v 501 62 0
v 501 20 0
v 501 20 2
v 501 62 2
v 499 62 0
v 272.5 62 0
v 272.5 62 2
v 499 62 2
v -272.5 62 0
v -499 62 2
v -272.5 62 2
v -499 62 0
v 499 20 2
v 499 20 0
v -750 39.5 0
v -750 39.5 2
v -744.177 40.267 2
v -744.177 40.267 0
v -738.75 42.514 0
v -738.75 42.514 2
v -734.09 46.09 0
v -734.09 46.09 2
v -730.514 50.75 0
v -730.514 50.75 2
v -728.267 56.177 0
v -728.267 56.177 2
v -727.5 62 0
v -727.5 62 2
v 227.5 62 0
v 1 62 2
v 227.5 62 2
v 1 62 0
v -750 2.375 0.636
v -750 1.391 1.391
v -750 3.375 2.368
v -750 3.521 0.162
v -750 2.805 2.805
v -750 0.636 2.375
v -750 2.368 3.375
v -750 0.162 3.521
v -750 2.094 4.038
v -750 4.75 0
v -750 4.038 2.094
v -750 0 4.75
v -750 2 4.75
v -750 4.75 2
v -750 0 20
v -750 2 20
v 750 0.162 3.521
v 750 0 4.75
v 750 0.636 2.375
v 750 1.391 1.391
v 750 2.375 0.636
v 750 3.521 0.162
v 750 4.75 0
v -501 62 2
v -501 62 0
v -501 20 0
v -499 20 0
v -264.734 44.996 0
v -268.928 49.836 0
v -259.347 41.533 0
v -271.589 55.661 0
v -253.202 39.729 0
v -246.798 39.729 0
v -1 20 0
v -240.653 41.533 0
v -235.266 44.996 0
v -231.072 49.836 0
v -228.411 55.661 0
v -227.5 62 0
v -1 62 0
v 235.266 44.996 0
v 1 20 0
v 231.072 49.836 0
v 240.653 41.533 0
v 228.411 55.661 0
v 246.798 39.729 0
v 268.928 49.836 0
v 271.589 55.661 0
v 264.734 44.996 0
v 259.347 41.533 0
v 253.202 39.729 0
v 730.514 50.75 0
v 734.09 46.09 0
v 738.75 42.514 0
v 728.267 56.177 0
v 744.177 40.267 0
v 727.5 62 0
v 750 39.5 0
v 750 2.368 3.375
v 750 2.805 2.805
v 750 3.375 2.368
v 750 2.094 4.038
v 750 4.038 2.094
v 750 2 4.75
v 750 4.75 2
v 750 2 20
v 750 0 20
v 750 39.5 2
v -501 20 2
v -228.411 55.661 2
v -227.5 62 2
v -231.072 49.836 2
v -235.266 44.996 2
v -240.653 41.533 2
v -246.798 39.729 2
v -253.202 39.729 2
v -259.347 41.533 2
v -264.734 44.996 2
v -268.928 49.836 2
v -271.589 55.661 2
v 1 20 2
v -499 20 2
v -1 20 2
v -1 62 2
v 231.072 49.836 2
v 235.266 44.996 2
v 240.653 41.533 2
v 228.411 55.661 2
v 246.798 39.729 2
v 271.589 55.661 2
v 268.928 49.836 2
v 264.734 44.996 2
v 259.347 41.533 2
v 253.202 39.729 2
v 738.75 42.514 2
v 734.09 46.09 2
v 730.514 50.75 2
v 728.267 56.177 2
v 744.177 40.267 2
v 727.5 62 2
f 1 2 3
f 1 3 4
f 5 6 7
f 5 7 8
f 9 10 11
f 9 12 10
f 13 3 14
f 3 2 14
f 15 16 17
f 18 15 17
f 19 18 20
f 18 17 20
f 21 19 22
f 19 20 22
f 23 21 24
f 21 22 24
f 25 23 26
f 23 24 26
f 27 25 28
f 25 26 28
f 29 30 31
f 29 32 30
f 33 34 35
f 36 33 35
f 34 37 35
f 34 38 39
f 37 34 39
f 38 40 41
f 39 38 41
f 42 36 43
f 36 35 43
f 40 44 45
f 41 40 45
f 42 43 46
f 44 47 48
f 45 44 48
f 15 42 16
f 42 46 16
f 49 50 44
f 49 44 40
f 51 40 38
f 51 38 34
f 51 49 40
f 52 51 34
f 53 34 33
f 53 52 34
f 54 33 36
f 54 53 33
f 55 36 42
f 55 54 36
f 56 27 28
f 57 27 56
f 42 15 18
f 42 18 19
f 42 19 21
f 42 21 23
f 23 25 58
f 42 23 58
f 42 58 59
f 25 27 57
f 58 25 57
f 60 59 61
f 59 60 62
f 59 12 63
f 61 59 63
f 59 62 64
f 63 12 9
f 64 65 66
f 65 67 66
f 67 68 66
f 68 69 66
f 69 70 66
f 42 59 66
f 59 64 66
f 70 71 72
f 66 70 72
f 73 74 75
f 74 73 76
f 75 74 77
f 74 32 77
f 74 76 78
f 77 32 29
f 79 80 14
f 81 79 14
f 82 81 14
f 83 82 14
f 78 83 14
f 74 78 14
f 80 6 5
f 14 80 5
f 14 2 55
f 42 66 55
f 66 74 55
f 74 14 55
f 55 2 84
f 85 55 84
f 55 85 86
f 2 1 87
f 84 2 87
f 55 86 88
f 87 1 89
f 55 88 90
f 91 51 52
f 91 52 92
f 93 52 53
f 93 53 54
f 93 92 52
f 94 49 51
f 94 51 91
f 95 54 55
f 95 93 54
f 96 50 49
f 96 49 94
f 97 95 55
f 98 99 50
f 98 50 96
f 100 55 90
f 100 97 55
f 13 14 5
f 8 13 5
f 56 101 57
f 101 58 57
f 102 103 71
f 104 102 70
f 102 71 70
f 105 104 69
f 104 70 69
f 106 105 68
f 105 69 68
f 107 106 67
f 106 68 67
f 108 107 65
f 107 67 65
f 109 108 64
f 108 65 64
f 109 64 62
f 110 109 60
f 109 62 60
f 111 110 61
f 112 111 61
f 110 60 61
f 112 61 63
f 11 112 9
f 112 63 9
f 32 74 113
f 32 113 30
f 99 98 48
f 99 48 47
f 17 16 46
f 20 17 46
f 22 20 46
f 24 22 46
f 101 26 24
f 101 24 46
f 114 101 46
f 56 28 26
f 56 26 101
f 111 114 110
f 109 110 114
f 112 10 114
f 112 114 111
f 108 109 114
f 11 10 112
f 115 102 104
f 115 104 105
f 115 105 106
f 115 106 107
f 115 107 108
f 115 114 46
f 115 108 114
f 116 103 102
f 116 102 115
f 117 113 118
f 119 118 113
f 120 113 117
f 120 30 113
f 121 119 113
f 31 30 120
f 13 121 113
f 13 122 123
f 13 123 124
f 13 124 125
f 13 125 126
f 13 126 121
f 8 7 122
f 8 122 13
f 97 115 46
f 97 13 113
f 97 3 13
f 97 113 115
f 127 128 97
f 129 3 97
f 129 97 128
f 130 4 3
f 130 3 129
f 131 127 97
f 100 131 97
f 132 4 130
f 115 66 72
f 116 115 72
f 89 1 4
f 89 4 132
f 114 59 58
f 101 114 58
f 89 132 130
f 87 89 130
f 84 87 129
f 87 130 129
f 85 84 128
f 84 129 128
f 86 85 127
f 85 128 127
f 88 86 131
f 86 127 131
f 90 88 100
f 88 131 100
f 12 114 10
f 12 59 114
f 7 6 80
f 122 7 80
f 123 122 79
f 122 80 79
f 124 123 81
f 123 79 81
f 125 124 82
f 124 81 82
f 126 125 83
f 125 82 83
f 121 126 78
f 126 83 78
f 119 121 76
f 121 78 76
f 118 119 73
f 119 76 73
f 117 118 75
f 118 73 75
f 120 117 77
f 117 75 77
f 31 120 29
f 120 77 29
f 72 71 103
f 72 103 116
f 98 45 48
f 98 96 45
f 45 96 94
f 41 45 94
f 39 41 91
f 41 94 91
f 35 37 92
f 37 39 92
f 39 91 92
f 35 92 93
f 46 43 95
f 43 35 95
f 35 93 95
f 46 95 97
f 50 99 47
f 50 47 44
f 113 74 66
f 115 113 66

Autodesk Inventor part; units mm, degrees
ref_plane "YZ Plane" through (0, 0, 0) normal (1, 0, 0) x (0, 1, 0)
ref_plane "XZ Plane" through (0, 0, 0) normal (0, 1, 0) x (-1, 0, 0)
ref_plane "XY Plane" through (0, 0, 0) normal (0, 0, 1) x (1, 0, 0)
sketch "Sketch1" plane through (0, 0, 0) normal (0, 0, 1) x (1, 0, 0)
  line L0 (-750, 62) -> (750, 62)
  line L1 (750, 62) -> (750, 0)
  line L2 (750, 0) -> (-750, 0)
  line L3 (-750, 0) -> (-750, 62)
  point P0 (0, 0)
  point P1 (0, 0)
  dimension "d0" = 1500
  dimension "d1" = 62
extrude "Plate1" add sketch "Sketch1" along normal blind 2
sketch "Sketch2" plane through (750, 2, 0) normal (0, -1, 0) x (1, 0, 0)
  line L0 (-1500, 0) -> (0, 0)
  line L1 (0, 0) -> (0, 20)
  line L2 (0, 20) -> (-1500, 20)
  line L3 (-1500, 20) -> (-1500, 0)
edge flange "Flange1" height 20 angle 90 thickness 2 bend radius 2.75 thickness toward (0, -1, 0) relief round relief width 2 relief depth 1 edges at (0, 0, 2) wall of the first edge with corners at (-750, 2, 0) (750, 2, 0) (750, 2, 20) (-750, 2, 20)
bend "Bend1"
corner "Corner1"
sketch "Sketch5" plane through (0, 0, 0) normal (0, 0, -1) x (-1, 0, 0)
  line L0 (750, 62) -> (-750, 62) projected
  line L1 (-1, 20) -> (-1, 62)
  line L2 (750, 0) -> (-750, 0) projected
  line L3 (-1, 20) -> (1, 20)
  line L4 (1, 20) -> (1, 62)
  point P0 (0, 0)
  point P1 (0, 20)
  point P2 (0, 0)
  dimension "d27" = 2
  dimension "d28" = 20
extrude "Extrusion1" cut sketch "Sketch5" against normal through all
pattern_linear "Rectangular Pattern1" count 3 spacing 500 along (1, 0, 0) of "Extrusion1" first direction both ways yes
sketch "Sketch6" plane through (0, 0, 0) normal (0, 0, -1) x (-1, 0, 0)
  line L0 (-750, 62) -> (-750, 4.75) projected
  circle A0 centre (-750, 62) radius 22.5
  line L1 (-750, 62) -> (750, 62) projected
  line L2 (-1, 20) -> (-1, 62) projected
  line L3 (-499, 62) -> (-499, 20) projected
  line L4 (-1, 20) -> (-499, 20) construction
  circle A1 centre (-250, 62) radius 22.5
  point P0 (0, 0)
  point P1 (-727.5, 62)
  point P2 (-750, 39.5)
  point P3 (-250, 20)
  dimension "d24" = 45
extrude "Extrusion2" cut sketch "Sketch6" along normal mid plane 30 contours L1 A0 L0 | A1 L1 | L1 A1 picked at (-748.3311, 47.188)
mirror "Mirror1" about plane through (0, 0, 0) normal (1, 0, 0) of "Extrusion2"
sketch "Sketch7" plane through (0, 0, 2) normal (0, 0, 1) x (1, 0, 0)
  arc A0 (-750, 39.5) -> (-727.5, 62) centre (-750, 62) ccw projected
  line L0 (-750, 4.75) -> (-750, 39.5) projected
  line L1 (-750, 4.75) -> (750, 4.75) projected
  line L2 (750, 39.5) -> (750, 4.75) projected
  arc A1 (727.5, 62) -> (750, 39.5) centre (750, 62) ccw projected
  line L3 (501, 62) -> (727.5, 62) projected
  line L4 (501, 62) -> (501, 20) projected
  line L5 (501, 20) -> (499, 20) projected
  line L6 (499, 20) -> (499, 62) projected
  line L7 (1, 62) -> (227.5, 62) projected
  line L8 (1, 62) -> (1, 20) projected
  line L9 (1, 20) -> (-1, 20) projected
  line L10 (-1, 20) -> (-1, 62) projected
  line L11 (-499, 62) -> (-272.5, 62) projected
  line L12 (-499, 62) -> (-499, 20) projected
  line L13 (-499, 20) -> (-501, 20) projected
  line L14 (-501, 20) -> (-501, 62) projected
  line L15 (-727.5, 62) -> (-501, 62) projected
  line L16 (650, 4.75) -> (650, 62) construction
  line L17 (-750, 4.75) -> (750, 4.75) projected
  circle A2 centre (650, 33.375) radius 5
  line L18 (272.5, 62) -> (499, 62) projected
  arc A3 (227.5, 62) -> (272.5, 62) centre (250, 62) ccw projected
  line L19 (-227.5, 62) -> (-1, 62) projected
  arc A4 (-272.5, 62) -> (-227.5, 62) centre (-250, 62) ccw projected
  point P0 (0, 0)
  dimension "d29" = 100
  dimension "d30" = 10
extrude "Extrusion3" [suppressed]
mirror "Mirror2" [suppressed]
sketch "Sketch8" plane through (0, 0, 2) normal (0, 0, 1) x (1, 0, 0)
  line L0 (494, 57) -> (494, 45) construction
  line L1 (494, 45) -> (294, 45) construction
  line L2 (294, 45) -> (294, 57) construction
  line L3 (294, 57) -> (494, 57) construction
  line L4 (501, 62) -> (727.5, 62) projected
  line L5 (272.5, 62) -> (499, 62) projected
  point P0 (0, 0)
  dimension "d33" = 200
  dimension "d34" = 12
  dimension "d37" = 5
  dimension "d38" = 5
mark "Mark2"
equation "\"d28\" = РЕБРА_полка"
equation "\"d1\" = БОРТ_стрингер_3_высота"
equation "\"d27\" = d18"
equation "\"d2\" = Thickness"
equation "\"d3\" = BendReliefWidth"
equation "\"d4\" = BendReliefDepth"
equation "\"d5\" = MinimumRemnant"
equation "\"d6\" = TransitionRadius"
equation "\"d9\" = BendRadius"
equation "\"d10\" = CornerReliefSize"
equation "\"d11\" = GapSize"
equation "\"d12\" = JacobiRadiusSize"
equation "\"BendReliefWidth\" = Thickness"
equation "\"BendReliefDepth\" = 0.5 * Thickness"
equation "\"CornerReliefSize\" = 4 * Thickness"
equation "\"MinimumRemnant\" = 2 * Thickness"
equation "\"TransitionRadius\" = BendRadius"
equation "\"JacobiRadiusSize\" = BendRadius"
equation "\"GapSize\" = Thickness"
equation "\"d18\" = Thickness"
equation "\"БОРТ_стрингер_3_высота\" = 62"
equation "\"Thickness\" = 2"
equation "\"BendRadius\" = 2.75"
equation "\"РЕБРА_полка\" = 20"
properties part number "MSC 316 stringer board #" material "Stainless Steel"
